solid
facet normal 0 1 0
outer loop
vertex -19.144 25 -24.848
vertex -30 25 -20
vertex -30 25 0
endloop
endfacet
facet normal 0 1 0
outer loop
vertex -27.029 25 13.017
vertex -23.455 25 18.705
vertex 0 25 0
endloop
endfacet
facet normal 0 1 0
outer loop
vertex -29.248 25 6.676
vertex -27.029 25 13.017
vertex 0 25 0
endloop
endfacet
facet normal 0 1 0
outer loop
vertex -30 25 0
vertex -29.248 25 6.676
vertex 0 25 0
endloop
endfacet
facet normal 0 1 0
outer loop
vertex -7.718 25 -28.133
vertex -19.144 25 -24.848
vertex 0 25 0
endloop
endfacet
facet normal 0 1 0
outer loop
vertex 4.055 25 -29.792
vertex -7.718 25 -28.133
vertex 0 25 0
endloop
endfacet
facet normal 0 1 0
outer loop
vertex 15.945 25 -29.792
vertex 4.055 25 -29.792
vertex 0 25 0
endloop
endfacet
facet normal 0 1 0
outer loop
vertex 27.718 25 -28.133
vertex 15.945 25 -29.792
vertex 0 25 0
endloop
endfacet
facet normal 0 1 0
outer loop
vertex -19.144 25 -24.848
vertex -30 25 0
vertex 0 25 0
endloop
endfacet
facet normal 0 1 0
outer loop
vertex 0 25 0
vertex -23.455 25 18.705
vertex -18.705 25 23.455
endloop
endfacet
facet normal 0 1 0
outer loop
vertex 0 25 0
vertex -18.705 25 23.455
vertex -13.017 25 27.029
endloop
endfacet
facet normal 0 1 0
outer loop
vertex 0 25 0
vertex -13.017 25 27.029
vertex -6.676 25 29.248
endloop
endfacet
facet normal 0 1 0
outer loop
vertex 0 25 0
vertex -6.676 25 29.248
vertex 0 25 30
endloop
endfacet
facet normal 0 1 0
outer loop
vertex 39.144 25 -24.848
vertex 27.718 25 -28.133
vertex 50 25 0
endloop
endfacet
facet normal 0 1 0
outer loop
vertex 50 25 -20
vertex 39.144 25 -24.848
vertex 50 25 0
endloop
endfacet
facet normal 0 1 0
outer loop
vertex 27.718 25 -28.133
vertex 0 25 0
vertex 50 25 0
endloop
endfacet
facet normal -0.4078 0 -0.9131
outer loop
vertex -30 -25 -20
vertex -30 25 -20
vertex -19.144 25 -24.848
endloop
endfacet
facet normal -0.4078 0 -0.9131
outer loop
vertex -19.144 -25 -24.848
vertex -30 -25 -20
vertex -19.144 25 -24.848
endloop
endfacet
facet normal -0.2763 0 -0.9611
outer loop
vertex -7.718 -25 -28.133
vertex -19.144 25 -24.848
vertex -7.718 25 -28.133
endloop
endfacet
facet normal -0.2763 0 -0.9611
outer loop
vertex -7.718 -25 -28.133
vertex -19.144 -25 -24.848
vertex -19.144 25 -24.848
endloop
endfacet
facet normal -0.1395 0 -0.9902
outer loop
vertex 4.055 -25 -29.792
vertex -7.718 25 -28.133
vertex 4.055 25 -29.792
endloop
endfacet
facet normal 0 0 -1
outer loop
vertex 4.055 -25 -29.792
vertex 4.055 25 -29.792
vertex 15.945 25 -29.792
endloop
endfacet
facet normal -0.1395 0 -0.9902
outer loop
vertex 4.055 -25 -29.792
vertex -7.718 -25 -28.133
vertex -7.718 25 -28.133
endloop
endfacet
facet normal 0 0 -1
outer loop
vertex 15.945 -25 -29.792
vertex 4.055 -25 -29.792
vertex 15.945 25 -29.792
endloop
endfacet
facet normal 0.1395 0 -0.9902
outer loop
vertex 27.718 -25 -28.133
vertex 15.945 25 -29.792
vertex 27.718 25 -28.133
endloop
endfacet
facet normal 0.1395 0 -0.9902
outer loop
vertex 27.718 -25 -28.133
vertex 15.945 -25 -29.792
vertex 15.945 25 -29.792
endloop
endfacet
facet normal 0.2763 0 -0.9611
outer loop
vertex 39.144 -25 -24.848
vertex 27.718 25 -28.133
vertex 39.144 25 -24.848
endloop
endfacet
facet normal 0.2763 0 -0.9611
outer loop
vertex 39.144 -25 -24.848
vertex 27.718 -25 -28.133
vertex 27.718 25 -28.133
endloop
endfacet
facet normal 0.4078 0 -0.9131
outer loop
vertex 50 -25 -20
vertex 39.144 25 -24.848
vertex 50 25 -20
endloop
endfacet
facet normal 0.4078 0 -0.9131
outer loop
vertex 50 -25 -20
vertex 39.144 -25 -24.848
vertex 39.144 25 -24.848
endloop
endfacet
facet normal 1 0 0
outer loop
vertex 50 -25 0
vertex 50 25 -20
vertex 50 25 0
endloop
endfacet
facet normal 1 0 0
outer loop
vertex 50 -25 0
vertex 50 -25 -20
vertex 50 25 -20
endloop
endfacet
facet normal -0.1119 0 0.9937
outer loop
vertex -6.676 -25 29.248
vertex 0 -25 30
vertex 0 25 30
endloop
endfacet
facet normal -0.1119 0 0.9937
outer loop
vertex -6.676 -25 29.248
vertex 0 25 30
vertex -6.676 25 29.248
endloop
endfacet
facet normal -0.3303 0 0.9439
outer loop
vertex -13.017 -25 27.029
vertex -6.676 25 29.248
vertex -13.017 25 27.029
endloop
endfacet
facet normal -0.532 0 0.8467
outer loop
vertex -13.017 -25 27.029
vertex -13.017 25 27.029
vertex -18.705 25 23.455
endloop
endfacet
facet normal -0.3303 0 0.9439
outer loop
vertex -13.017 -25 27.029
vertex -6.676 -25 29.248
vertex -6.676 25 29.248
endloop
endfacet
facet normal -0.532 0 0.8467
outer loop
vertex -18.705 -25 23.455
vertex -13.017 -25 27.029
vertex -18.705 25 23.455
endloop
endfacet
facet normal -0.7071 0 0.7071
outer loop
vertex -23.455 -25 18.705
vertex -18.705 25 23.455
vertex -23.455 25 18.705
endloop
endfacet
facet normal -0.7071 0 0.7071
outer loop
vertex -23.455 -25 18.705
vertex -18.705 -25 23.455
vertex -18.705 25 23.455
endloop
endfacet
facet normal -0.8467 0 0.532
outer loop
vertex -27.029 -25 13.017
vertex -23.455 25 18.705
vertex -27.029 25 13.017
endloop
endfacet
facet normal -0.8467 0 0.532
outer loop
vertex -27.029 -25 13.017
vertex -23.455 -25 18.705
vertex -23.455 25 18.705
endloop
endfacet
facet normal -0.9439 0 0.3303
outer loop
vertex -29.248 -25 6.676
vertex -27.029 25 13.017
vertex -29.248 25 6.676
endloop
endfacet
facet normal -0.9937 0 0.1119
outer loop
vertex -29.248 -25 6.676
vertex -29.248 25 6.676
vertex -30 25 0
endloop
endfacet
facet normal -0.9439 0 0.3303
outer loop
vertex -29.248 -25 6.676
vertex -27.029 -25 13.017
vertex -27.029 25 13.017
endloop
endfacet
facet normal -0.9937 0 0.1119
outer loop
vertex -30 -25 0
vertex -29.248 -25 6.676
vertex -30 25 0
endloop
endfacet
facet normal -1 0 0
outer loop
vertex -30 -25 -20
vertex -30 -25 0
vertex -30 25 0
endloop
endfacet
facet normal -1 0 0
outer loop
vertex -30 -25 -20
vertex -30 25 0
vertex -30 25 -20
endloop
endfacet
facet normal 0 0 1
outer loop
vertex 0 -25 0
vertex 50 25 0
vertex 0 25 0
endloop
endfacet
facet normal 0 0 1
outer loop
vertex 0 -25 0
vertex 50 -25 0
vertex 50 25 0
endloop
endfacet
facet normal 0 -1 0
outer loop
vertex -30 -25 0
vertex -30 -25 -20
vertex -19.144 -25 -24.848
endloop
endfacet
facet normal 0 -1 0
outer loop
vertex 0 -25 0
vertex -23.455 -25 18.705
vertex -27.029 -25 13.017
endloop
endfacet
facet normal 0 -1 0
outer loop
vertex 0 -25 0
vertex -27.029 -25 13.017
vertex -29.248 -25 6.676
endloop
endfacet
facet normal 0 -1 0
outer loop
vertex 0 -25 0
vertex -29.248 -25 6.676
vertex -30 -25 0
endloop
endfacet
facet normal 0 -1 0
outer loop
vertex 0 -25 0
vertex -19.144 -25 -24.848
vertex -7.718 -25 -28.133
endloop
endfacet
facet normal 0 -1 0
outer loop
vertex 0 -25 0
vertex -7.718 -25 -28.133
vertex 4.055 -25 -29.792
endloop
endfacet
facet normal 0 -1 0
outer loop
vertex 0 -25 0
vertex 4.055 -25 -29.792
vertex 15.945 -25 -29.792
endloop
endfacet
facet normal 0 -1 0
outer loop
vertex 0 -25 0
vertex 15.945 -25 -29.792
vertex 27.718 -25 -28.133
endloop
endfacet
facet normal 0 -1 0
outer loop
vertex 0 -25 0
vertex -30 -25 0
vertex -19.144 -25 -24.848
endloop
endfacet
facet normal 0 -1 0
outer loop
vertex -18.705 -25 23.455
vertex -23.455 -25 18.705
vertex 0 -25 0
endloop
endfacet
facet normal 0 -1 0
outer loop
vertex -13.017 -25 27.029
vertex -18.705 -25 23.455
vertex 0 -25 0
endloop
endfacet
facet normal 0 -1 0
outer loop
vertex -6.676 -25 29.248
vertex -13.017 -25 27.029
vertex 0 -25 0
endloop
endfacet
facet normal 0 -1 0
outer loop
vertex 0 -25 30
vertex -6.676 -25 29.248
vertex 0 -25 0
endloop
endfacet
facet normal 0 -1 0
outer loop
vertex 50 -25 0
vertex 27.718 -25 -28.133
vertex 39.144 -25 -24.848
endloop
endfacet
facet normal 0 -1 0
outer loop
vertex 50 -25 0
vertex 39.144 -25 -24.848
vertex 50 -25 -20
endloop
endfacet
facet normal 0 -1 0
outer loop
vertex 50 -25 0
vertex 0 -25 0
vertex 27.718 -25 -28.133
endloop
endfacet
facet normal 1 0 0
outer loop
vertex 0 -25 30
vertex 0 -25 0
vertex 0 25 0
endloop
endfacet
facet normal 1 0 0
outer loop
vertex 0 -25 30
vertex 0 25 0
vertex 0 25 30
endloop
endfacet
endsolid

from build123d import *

# Parameters (mm, degrees)
F1_DEPTH = 25


with BuildPart() as f1:
    # F0 (on Front) → F1 (new body, symmetric)
    with BuildSketch(Plane.XZ):
        with BuildLine():
            Line((50, 0), (0, 0))
            Line((0, 0), (0, 30))
            ThreePointArc((0, 30), (-21.213203, 21.213203), (-30, 0))
            Line((-30, 0), (-30, -20))
            ThreePointArc((-30, -20), (10, -30), (50, -20))
            Line((50, -20), (50, 0))
        make_face()
    extrude(amount=F1_DEPTH, both=True)


solid = f1.part
